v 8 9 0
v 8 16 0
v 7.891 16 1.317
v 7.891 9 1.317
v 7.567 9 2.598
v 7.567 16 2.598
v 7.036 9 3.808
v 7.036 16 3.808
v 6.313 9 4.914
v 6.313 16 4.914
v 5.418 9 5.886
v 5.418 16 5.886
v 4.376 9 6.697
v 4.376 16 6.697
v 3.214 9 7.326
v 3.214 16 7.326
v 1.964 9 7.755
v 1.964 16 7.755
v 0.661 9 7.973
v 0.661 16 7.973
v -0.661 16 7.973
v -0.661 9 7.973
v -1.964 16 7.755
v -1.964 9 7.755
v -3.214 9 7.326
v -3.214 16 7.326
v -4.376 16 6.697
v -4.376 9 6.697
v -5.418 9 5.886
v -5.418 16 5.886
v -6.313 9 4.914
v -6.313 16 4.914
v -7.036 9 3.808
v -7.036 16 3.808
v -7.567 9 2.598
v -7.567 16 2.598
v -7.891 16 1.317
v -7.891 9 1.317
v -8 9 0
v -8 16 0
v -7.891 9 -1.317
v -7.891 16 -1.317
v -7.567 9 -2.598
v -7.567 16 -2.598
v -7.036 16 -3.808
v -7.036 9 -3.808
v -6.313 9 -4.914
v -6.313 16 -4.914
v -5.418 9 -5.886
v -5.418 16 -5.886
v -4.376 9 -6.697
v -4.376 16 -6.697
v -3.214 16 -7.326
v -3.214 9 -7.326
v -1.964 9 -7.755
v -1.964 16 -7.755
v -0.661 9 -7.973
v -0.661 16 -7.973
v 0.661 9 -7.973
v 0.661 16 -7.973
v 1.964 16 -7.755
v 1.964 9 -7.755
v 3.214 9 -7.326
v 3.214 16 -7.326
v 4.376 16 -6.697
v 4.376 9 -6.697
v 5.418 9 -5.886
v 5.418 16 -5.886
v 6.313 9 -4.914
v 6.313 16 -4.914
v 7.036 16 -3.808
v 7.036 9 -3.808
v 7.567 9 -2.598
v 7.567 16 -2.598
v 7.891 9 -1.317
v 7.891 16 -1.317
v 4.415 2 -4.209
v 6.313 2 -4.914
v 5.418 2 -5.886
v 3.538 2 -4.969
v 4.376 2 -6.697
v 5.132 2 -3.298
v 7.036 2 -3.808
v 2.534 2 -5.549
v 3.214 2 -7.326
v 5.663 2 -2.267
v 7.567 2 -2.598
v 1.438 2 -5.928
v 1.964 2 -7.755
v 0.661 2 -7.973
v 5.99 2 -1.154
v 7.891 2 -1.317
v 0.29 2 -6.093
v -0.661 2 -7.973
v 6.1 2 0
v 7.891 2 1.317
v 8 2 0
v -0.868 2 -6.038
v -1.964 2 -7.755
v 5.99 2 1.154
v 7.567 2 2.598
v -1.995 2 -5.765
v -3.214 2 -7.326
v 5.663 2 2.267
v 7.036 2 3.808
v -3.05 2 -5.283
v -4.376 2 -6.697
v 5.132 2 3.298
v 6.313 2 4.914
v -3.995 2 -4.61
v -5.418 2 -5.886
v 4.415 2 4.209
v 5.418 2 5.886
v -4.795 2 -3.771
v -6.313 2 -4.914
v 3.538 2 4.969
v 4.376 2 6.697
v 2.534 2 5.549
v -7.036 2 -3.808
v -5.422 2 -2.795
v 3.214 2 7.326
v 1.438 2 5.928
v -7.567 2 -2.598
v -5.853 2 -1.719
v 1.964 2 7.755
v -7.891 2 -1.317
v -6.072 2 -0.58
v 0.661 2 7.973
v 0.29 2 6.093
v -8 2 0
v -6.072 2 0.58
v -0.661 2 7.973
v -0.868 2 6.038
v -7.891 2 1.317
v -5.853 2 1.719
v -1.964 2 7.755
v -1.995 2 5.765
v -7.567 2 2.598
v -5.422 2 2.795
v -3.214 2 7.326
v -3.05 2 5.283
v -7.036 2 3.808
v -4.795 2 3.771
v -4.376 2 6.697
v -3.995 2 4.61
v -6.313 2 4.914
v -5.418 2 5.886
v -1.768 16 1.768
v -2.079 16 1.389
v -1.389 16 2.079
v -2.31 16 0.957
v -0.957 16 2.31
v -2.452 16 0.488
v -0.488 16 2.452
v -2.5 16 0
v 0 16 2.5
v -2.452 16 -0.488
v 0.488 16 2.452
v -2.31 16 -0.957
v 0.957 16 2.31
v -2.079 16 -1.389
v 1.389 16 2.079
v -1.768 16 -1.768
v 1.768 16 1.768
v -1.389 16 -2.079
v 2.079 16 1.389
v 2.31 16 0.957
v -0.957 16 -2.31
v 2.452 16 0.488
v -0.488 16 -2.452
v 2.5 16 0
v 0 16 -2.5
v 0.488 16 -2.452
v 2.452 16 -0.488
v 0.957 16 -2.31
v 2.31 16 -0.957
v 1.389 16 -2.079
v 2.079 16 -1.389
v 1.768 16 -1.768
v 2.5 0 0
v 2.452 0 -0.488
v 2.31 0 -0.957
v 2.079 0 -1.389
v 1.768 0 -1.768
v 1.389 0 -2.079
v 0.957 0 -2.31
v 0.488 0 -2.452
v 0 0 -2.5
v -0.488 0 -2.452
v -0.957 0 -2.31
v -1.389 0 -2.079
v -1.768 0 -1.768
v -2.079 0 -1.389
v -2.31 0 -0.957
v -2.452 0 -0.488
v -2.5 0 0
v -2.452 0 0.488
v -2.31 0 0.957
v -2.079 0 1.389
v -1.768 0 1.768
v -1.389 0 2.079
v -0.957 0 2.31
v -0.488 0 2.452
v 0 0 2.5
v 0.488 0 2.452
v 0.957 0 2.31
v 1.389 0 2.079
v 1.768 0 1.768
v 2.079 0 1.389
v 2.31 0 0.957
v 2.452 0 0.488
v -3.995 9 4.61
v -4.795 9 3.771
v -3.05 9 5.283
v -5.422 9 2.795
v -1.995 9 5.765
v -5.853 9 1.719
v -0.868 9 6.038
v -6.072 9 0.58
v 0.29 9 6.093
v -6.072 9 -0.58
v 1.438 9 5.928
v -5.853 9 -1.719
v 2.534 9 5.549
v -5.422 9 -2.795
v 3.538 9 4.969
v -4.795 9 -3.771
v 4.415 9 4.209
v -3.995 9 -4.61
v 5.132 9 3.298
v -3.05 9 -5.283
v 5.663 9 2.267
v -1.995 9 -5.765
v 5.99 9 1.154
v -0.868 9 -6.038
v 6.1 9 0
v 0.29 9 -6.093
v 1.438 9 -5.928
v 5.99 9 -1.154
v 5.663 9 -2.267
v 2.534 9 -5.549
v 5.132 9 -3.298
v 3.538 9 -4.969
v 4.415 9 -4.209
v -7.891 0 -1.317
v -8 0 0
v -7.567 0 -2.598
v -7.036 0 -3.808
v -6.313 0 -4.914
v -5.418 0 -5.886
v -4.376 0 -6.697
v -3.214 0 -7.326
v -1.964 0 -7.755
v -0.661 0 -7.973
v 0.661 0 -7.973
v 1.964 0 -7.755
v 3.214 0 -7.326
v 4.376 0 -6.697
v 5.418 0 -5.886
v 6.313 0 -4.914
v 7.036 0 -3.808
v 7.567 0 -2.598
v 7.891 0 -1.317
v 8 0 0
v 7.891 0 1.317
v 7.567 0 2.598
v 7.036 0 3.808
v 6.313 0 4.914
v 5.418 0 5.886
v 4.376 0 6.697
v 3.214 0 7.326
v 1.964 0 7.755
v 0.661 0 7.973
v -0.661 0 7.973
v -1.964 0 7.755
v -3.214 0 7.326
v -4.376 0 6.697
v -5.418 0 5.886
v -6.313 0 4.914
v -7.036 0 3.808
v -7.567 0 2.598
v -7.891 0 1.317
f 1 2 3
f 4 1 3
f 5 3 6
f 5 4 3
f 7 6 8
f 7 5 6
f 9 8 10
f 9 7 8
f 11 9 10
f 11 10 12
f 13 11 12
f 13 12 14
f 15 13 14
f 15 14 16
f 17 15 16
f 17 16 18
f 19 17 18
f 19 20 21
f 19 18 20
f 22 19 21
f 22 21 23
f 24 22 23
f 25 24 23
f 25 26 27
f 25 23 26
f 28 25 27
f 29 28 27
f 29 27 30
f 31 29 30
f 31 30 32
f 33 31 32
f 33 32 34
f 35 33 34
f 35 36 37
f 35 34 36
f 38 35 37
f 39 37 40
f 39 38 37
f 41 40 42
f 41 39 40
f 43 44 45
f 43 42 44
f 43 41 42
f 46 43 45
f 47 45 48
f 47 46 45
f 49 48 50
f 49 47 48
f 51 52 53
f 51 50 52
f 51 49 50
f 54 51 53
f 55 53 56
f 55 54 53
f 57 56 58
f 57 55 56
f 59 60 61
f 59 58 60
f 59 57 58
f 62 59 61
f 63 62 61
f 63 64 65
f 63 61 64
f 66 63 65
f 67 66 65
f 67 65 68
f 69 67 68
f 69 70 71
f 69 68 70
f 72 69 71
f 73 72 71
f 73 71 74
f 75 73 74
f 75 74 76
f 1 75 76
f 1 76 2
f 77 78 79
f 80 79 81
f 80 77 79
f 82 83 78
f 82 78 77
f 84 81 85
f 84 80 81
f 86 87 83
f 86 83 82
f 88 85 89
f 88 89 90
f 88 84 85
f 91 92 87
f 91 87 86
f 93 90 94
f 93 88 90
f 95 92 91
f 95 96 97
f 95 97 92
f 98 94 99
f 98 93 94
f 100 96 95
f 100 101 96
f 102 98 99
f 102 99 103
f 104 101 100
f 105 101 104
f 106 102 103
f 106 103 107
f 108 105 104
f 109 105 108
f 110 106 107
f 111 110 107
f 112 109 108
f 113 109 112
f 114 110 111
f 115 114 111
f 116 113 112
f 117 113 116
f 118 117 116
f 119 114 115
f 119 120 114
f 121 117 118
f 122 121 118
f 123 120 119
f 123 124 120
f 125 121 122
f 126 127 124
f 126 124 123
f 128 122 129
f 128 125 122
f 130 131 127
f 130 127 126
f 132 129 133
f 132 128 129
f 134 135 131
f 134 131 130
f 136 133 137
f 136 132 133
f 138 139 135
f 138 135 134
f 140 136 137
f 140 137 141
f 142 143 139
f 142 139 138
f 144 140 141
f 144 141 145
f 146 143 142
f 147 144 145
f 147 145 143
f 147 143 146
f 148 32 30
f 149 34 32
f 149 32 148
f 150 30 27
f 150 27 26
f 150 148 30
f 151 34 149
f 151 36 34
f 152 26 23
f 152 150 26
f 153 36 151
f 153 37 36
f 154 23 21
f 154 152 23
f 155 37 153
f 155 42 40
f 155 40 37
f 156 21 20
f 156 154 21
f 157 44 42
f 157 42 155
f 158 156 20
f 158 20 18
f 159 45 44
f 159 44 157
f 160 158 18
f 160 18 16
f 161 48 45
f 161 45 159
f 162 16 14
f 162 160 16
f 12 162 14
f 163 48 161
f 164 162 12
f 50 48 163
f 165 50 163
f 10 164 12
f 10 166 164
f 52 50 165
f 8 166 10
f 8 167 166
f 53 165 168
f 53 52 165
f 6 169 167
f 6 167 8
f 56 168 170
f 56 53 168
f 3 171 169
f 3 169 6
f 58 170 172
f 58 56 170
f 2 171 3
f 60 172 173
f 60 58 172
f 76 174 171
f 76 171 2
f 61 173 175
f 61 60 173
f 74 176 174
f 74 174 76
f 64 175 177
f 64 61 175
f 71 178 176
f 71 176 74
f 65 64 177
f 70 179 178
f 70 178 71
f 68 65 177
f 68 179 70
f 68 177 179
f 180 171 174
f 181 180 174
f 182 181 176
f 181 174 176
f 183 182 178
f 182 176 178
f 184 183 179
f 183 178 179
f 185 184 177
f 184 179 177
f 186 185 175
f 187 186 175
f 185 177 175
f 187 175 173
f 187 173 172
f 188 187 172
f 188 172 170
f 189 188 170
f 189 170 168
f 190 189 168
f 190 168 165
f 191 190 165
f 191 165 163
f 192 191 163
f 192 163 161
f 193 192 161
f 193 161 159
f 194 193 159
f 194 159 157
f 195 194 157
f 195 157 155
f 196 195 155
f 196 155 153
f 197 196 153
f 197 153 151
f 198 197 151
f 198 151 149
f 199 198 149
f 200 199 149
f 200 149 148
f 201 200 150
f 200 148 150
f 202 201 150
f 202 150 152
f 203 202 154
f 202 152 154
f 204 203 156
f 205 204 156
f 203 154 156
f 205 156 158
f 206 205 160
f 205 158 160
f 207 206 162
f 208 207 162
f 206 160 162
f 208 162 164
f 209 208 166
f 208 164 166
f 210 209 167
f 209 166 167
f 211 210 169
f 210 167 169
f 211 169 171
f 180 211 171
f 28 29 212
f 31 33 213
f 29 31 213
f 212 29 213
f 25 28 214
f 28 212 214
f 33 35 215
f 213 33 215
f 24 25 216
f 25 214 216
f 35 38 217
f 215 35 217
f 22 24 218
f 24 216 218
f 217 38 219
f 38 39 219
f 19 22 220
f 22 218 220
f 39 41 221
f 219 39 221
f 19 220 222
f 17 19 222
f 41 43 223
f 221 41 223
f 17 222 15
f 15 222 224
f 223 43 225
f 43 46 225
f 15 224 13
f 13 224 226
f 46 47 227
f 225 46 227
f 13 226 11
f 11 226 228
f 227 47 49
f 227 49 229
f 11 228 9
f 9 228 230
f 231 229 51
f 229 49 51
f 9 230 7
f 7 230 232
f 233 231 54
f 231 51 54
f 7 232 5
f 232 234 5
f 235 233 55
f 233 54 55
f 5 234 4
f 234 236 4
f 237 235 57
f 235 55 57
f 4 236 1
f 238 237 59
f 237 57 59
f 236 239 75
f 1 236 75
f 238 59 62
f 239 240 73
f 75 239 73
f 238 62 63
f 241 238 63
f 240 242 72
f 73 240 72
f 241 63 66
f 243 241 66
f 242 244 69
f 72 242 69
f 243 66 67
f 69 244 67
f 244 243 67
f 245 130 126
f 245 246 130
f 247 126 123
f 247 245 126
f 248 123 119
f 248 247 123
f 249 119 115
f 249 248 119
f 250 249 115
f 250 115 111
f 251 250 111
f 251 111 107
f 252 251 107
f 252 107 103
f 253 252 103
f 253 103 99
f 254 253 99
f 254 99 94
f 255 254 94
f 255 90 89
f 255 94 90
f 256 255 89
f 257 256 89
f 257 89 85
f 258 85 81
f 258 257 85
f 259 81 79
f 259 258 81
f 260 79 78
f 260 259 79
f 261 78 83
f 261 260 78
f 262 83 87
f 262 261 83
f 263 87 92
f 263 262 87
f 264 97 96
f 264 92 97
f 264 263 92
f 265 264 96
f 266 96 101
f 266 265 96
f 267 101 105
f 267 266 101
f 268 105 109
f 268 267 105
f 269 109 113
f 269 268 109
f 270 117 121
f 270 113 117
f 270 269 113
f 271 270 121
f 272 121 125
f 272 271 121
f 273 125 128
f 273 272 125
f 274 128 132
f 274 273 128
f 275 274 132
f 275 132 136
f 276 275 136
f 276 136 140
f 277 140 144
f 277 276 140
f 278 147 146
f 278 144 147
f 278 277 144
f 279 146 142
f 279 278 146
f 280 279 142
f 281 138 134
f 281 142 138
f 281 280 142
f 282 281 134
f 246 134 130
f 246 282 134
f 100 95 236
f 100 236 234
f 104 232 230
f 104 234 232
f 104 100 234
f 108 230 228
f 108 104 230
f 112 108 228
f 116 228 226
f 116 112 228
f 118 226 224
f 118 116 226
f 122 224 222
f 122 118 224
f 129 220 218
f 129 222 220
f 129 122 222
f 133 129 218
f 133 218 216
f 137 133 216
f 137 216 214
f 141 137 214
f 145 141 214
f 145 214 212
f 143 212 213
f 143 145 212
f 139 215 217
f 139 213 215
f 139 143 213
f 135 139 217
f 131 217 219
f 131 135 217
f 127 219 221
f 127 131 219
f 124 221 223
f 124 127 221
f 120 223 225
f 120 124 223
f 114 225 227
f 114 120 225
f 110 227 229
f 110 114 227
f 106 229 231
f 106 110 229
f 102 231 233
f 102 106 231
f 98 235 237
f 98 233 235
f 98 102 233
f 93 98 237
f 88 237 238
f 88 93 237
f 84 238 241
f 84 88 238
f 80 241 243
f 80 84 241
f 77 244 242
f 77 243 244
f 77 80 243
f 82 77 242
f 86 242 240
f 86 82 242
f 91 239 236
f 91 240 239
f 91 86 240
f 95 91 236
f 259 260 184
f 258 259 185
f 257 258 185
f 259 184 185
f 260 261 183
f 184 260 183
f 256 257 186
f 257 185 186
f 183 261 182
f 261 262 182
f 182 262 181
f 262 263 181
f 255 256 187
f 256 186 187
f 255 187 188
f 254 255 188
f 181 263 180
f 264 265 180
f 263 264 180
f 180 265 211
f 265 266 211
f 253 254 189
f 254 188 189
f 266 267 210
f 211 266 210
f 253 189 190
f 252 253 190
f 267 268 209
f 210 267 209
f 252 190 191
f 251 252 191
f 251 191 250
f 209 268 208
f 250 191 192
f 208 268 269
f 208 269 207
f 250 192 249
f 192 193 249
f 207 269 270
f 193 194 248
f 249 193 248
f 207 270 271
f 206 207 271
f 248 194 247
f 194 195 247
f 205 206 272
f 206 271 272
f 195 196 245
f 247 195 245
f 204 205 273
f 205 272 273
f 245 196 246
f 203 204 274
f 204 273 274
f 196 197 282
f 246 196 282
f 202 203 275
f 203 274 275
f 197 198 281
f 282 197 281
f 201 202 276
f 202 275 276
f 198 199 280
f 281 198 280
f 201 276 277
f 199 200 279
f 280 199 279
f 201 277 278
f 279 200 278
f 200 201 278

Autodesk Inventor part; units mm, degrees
ref_plane "YZ Plane" through (0, 0, 0) normal (1, 0, 0) x (0, 1, 0)
ref_plane "XZ Plane" through (0, 0, 0) normal (0, 1, 0) x (-1, 0, 0)
ref_plane "XY Plane" through (0, 0, 0) normal (0, 0, 1) x (1, 0, 0)
sketch "Sketch1" plane through (0, 0, 0) normal (0, 1, 0) x (-1, 0, 0)
  circle A0 centre (0, 0) radius 8
  dimension "d0" = 16
extrude "Extrusion1" add sketch "Sketch1" along normal blind 2
sketch "Sketch2" plane through (0, 2, 0) normal (0, 1, 0) x (1, 0, 0)
  circle A0 centre (0, 0) radius 8 projected
  circle A1 centre (0, 0) radius 6.1
  dimension "d3" = 12.2
extrude "Extrusion2" add sketch "Sketch2" along normal blind 7 contours A1
sketch "Sketch3" plane through (0, 9, 0) normal (0, 1, 0) x (1, 0, 0)
  circle A0 centre (0, 0) radius 6.1 projected
  circle A1 centre (0, 0) radius 8 projected
extrude "Extrusion3" add sketch "Sketch3" along normal blind 7 contours A0 | A1
sketch "Sketch4" plane through (0, 16, 0) normal (0, 1, 0) x (1, 0, 0)
  circle A0 centre (0, 0) radius 2.5
  dimension "d8" = 5
extrude "Extrusion4" cut sketch "Sketch4" against normal through all
properties part number "GT2_5mm_Pulley"
